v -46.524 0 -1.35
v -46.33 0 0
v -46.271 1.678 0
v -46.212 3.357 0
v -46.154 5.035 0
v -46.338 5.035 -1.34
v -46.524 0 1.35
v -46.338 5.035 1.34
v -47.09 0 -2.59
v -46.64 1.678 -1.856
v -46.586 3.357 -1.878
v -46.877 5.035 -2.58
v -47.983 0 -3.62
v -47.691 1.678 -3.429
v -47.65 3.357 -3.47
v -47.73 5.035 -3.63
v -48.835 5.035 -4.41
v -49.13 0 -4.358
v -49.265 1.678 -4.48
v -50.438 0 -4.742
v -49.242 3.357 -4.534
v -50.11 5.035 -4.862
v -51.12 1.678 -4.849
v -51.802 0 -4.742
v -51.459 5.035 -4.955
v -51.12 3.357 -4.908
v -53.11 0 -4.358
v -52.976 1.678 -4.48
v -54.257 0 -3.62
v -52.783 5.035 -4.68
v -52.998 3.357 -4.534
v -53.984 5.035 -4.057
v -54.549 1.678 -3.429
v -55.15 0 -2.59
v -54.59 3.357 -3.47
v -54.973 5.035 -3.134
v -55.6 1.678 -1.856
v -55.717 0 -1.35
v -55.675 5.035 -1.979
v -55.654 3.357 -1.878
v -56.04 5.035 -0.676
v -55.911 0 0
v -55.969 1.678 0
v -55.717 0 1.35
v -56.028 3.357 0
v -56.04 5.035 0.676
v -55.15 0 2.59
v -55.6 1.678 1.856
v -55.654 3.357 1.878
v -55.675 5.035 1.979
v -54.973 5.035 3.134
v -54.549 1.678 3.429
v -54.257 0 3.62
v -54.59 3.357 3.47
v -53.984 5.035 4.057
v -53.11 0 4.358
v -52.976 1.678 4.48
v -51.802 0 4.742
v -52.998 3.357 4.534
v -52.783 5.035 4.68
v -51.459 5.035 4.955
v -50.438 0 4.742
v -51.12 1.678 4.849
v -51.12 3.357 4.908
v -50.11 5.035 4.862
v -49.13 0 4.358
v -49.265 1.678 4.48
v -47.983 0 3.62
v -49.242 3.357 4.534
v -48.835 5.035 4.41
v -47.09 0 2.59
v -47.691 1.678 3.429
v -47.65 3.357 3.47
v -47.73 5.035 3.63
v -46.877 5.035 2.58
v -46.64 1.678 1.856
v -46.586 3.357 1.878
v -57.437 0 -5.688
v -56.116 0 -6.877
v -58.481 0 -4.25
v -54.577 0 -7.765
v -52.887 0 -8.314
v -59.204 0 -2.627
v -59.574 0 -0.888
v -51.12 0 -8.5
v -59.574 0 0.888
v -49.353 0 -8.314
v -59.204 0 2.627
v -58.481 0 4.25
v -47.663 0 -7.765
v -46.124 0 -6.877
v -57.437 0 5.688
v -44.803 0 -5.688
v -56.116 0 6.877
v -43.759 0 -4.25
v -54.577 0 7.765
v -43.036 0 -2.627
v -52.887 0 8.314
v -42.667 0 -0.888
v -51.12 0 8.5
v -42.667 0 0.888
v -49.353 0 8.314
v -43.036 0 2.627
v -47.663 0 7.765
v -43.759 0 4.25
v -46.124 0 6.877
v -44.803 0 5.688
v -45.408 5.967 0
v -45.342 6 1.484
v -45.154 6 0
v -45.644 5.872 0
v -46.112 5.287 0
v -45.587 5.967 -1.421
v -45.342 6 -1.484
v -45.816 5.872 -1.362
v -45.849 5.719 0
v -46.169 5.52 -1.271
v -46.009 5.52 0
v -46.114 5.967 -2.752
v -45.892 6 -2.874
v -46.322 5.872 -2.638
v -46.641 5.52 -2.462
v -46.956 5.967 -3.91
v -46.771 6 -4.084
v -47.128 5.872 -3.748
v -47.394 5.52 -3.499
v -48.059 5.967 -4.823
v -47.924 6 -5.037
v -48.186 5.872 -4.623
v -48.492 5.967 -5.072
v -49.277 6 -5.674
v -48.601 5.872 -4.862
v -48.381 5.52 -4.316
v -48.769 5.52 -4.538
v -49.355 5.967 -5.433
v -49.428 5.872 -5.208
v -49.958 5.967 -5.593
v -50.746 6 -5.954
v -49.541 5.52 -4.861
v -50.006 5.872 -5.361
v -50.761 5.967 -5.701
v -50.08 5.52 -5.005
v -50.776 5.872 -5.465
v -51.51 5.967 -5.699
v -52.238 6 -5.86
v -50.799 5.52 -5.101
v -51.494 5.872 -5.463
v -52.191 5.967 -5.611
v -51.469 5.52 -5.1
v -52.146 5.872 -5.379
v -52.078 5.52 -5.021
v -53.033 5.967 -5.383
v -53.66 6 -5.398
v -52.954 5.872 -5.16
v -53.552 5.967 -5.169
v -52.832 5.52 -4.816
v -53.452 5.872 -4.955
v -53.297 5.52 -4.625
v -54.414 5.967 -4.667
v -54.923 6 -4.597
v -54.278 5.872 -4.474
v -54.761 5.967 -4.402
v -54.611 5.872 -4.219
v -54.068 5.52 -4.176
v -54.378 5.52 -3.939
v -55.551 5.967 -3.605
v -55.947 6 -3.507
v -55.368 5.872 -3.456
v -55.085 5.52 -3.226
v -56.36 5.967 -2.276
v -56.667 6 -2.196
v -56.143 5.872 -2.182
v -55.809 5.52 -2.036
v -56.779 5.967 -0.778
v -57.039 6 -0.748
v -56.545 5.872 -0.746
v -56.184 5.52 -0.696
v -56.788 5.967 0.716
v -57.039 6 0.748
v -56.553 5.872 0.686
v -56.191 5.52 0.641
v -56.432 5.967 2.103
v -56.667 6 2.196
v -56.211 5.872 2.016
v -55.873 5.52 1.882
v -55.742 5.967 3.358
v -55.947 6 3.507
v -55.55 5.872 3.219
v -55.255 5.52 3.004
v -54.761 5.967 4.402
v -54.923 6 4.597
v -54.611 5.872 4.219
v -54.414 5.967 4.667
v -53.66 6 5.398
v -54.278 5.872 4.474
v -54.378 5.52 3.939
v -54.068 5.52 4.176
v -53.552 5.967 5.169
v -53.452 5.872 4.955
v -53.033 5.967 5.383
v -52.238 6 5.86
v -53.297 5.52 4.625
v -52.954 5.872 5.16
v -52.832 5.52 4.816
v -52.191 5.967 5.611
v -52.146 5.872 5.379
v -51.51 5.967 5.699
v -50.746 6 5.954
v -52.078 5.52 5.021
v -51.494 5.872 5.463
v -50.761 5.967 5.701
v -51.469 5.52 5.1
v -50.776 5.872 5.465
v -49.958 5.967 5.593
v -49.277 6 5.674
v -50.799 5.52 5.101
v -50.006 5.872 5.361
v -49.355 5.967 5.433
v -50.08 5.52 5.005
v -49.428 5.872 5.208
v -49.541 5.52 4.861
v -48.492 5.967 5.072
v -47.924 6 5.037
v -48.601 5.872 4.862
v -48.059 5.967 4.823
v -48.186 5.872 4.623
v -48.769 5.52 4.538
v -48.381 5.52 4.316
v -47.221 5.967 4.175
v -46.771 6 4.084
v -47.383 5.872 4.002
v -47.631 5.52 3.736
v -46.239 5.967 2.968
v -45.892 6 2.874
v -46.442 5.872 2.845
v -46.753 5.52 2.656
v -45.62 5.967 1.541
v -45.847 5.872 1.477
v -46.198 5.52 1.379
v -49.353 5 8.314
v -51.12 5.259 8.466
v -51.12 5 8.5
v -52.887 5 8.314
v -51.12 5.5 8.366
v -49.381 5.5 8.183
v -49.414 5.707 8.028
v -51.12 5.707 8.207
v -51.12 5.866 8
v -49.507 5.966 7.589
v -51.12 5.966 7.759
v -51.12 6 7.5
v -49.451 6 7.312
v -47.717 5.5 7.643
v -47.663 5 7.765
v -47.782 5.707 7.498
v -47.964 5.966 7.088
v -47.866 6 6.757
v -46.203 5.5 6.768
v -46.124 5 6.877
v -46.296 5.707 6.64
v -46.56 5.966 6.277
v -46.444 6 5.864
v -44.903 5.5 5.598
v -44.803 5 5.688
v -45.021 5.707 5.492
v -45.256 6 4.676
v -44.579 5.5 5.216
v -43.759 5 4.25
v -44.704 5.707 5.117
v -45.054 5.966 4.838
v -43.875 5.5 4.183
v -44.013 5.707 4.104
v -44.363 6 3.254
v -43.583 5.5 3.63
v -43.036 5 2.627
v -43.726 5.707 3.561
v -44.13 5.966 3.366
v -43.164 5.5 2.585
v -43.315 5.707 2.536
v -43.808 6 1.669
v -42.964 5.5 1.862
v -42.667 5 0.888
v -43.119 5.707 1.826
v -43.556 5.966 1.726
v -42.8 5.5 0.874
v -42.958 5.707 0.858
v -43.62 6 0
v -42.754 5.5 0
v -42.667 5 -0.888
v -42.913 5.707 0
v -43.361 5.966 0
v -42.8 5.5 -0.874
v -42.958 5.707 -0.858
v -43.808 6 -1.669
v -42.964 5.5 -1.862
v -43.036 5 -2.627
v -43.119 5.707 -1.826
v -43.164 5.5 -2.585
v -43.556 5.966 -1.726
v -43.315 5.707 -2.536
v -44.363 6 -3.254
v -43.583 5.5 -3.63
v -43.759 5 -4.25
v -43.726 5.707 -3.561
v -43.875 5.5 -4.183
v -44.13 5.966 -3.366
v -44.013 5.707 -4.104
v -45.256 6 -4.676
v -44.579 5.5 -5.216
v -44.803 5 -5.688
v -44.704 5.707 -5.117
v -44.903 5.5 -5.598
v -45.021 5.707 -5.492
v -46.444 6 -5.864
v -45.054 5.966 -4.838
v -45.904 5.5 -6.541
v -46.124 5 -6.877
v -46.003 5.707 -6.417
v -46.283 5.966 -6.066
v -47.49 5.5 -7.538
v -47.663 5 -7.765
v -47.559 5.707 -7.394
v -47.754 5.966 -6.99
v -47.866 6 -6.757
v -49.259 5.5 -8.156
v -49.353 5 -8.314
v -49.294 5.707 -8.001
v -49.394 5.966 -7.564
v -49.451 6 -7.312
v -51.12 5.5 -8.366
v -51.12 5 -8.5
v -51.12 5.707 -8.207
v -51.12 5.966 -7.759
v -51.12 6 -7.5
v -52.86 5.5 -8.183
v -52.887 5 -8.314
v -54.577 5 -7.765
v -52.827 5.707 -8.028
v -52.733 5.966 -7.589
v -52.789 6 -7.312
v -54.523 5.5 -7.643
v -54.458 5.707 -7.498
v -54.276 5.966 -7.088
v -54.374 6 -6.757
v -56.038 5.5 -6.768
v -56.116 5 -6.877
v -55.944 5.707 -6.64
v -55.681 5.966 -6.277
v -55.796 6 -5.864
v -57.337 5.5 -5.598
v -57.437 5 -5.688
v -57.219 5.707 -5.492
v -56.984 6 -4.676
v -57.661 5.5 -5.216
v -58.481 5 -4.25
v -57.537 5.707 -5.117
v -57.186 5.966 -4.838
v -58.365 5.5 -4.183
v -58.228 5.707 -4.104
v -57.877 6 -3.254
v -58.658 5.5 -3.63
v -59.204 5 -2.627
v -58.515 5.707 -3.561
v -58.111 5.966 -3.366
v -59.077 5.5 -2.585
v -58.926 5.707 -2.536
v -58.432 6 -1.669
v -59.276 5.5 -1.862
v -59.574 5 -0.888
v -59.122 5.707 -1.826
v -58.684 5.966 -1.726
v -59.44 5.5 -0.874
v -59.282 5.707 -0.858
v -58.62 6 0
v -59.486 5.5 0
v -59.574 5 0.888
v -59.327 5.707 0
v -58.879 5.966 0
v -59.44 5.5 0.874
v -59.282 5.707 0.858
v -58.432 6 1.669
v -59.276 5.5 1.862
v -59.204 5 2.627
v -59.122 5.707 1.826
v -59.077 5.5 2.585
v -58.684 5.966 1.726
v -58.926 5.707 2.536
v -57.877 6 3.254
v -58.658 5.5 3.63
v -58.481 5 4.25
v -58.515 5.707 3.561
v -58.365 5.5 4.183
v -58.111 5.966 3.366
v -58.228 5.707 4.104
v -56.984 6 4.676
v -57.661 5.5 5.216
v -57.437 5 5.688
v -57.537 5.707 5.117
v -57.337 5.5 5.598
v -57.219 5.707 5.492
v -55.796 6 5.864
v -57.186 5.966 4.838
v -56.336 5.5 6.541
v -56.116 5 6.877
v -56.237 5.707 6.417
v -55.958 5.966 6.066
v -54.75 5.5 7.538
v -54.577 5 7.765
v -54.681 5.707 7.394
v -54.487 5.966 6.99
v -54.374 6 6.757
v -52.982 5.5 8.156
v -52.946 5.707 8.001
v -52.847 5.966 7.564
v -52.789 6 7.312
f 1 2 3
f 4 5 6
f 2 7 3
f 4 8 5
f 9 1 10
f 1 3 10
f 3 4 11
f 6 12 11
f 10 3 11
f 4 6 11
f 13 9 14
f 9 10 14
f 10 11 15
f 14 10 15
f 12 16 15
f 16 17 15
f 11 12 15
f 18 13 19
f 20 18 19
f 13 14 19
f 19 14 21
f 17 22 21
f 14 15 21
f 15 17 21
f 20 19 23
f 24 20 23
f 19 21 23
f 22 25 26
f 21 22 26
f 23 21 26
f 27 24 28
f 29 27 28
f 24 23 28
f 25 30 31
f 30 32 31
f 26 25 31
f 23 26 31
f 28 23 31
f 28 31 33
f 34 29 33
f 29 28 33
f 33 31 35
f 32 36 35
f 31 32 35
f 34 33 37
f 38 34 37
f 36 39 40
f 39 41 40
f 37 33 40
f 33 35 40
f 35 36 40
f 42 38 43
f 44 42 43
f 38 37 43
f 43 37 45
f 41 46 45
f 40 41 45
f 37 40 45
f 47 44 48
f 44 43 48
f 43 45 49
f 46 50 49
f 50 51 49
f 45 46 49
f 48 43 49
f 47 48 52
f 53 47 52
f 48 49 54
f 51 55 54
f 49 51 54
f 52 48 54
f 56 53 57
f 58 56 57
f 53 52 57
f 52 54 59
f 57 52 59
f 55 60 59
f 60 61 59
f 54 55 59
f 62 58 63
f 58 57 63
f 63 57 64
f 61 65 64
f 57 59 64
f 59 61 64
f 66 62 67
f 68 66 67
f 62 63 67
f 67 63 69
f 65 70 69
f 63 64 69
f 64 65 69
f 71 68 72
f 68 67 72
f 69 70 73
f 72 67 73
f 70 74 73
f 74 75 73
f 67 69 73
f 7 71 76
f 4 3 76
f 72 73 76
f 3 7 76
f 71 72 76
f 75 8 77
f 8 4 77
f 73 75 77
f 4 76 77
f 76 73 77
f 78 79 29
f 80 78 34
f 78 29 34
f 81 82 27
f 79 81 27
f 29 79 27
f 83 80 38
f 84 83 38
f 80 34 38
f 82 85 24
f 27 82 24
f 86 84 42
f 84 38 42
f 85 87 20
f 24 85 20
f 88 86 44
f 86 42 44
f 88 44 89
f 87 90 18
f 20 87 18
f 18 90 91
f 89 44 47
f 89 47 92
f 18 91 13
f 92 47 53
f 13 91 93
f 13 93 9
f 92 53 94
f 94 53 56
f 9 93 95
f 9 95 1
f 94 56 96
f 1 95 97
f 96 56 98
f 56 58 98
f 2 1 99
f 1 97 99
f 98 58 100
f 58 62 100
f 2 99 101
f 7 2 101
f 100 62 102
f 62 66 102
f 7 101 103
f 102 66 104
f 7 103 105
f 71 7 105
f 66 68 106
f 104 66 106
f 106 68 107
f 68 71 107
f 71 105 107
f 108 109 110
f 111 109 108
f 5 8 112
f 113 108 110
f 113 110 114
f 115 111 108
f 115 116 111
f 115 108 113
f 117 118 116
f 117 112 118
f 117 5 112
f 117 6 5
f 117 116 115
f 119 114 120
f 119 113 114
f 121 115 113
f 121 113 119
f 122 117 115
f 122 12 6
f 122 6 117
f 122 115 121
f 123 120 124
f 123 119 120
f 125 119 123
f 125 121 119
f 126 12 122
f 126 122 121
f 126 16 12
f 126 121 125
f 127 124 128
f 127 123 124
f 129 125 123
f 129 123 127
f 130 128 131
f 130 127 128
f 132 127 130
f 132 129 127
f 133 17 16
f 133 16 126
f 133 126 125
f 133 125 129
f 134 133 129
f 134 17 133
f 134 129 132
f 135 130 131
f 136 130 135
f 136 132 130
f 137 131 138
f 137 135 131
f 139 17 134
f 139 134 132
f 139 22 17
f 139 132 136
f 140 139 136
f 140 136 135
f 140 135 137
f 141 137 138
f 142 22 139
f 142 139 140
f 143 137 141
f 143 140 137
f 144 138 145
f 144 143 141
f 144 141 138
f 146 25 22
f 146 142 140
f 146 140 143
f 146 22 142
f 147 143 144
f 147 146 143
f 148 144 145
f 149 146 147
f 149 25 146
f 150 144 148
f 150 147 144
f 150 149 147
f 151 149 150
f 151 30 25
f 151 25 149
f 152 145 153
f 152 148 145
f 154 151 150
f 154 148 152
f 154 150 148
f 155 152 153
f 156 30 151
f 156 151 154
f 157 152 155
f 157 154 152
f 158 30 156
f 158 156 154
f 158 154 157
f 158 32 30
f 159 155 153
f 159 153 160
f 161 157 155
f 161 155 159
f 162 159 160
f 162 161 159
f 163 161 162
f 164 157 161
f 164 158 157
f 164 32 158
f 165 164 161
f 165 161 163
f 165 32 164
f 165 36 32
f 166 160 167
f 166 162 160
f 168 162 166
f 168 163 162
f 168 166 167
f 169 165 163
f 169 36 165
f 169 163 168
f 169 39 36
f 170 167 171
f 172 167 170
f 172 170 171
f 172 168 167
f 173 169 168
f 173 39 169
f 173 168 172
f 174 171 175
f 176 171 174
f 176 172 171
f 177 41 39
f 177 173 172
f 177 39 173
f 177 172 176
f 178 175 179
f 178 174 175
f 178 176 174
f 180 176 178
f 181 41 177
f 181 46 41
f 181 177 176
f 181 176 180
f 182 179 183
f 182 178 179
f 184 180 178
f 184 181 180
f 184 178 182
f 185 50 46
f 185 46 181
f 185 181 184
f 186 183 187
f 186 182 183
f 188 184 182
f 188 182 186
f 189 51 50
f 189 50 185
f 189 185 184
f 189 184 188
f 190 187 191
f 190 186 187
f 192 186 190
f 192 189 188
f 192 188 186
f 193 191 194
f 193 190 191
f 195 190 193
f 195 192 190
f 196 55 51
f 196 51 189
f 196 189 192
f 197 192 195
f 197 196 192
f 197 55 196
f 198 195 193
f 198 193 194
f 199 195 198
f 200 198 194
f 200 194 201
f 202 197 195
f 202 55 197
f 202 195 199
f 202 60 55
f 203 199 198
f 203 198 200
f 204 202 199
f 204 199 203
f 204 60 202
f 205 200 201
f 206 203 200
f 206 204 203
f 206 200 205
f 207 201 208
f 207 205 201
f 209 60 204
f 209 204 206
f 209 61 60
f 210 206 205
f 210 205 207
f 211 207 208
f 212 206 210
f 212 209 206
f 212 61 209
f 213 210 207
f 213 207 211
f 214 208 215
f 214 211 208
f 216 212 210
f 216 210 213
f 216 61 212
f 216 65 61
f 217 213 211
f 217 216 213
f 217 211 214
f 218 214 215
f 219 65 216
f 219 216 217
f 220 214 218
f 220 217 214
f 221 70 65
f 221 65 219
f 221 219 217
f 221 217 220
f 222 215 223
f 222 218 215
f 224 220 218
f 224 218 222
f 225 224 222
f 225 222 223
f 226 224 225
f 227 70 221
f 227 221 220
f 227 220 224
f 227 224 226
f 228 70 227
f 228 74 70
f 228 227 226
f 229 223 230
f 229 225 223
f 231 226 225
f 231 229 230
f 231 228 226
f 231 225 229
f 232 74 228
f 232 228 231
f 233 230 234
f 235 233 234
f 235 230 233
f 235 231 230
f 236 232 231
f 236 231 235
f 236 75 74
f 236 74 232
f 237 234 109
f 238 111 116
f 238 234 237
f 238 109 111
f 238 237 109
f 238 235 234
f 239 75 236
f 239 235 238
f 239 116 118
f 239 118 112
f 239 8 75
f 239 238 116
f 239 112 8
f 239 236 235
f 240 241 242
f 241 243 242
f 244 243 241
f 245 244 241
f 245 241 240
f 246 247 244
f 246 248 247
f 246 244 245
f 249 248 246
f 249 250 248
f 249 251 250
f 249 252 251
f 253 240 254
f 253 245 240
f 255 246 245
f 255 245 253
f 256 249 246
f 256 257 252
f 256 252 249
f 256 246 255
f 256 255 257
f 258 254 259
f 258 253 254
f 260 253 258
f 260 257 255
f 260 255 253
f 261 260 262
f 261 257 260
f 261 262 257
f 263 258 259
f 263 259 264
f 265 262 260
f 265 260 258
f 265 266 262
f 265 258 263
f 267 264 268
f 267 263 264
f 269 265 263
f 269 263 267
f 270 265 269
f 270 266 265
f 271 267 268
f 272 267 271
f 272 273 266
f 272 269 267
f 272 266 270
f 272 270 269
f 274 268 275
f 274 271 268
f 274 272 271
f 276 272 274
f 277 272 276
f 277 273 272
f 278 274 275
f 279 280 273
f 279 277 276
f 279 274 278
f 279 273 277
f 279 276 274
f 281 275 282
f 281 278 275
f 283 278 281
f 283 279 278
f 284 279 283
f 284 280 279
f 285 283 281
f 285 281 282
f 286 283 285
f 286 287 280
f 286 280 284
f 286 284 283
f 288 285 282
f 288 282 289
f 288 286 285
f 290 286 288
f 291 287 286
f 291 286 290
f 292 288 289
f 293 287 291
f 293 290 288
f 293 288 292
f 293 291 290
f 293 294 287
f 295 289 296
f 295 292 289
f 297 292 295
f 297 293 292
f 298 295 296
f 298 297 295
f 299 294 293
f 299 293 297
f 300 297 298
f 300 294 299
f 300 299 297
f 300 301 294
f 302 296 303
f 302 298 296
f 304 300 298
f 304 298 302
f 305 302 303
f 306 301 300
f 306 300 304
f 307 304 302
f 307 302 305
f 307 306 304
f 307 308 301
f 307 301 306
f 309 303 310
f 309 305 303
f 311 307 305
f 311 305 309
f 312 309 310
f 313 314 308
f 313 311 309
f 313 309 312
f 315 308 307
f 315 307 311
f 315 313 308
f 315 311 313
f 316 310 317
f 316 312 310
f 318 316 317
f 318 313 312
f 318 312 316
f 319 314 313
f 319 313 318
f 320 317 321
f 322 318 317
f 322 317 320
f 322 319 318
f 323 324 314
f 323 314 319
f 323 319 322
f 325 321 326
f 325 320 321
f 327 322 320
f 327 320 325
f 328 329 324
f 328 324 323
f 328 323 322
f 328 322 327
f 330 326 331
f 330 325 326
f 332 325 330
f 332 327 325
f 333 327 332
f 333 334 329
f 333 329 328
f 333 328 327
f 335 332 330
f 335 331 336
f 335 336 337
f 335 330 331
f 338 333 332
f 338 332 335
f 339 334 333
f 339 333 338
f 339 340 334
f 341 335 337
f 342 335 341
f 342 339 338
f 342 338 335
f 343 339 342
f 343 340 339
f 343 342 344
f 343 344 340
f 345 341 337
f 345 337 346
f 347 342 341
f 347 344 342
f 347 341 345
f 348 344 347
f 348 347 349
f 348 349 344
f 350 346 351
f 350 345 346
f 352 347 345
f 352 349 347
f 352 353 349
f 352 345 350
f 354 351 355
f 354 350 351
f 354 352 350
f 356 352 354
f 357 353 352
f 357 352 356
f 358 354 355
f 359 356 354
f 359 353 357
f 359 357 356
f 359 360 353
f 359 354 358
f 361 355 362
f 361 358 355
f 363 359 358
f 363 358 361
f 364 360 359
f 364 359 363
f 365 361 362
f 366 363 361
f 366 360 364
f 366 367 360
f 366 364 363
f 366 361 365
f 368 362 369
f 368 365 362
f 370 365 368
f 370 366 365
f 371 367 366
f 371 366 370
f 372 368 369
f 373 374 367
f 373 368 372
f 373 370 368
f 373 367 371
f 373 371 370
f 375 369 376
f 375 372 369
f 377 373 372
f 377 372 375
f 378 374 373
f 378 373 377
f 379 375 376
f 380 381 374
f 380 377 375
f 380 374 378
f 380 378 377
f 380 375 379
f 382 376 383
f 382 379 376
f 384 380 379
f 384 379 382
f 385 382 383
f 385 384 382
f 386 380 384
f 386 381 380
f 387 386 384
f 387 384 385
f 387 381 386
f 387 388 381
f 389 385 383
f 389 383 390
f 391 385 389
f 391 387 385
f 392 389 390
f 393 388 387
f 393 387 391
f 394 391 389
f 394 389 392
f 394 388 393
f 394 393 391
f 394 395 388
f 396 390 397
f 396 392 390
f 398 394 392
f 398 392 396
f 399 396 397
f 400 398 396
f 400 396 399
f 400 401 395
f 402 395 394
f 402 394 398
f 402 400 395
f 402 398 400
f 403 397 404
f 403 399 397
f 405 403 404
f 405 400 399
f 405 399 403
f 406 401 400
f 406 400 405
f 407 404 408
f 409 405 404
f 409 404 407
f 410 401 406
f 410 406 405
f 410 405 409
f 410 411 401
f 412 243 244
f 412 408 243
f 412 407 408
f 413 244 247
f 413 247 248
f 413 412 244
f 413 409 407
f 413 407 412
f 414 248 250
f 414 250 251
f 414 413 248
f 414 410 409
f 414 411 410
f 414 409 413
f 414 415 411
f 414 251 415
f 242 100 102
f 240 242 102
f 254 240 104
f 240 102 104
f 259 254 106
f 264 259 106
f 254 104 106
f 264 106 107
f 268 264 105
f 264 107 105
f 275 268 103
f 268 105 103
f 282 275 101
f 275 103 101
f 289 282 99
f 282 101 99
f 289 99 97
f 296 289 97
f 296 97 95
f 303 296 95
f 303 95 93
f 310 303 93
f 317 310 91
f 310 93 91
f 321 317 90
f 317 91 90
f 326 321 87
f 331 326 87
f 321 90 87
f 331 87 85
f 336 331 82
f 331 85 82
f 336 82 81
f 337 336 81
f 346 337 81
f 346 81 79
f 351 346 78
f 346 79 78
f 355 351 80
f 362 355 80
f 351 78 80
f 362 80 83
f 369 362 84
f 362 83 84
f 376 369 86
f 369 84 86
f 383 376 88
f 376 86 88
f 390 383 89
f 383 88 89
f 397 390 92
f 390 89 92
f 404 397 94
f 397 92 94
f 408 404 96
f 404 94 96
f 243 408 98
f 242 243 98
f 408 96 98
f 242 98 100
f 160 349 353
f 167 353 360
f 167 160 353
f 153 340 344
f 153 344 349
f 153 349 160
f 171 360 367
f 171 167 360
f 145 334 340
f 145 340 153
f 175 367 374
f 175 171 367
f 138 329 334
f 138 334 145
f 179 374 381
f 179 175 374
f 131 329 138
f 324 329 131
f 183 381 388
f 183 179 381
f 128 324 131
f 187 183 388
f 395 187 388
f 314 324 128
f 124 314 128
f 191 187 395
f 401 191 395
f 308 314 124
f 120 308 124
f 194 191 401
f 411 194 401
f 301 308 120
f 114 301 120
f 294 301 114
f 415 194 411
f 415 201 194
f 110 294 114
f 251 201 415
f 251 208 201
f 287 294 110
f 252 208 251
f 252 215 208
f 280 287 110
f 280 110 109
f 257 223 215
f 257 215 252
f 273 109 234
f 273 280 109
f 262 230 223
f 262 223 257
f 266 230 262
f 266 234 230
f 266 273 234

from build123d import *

# Parameters (mm, degrees)
SKETCH1_R           = 8.5
BOSS_EXTRUDE1_DEPTH = 6
FILLET2_R           = 1
SKETCH2_R           = 5
CUT_EXTRUDE4_DEPTH  = 6
CUT_EXTRUDE4_DRAFT  = -2
FILLET5_R           = 1


with BuildPart() as part:
    # Sketch1 → Boss-Extrude1 (new body)
    with BuildSketch(Plane(origin=(0, 0, 0), x_dir=(1, 0, 0), z_dir=(0, 1, 0))):
        with Locations(Location((-51.120170416, 0, 0), (0, 0, 270))):
            Circle(SKETCH1_R)
    extrude(amount=BOSS_EXTRUDE1_DEPTH)

    # Fillet2
    fillet2_edges = [part.edges().sort_by_distance(p)[0] for p in [
        (-51.120170416, 6, -8.5),
    ]]
    fillet(fillet2_edges, radius=FILLET2_R)


with BuildPart() as cut_extrude4_tool:
    # Sketch2 → Cut-Extrude4 (with draft: the straight prism first)
    with BuildSketch(Plane(origin=(0, 6, 0), x_dir=(1, 0, 0), z_dir=(0, 1, 0))):
        with Locations((-51.120170416, 0)):
            Circle(SKETCH2_R)
    extrude(amount=-CUT_EXTRUDE4_DEPTH)
    # Cut-Extrude4: the draft: its side faces are tilted about the plane it starts from
    cut_extrude4_sides = [cut_extrude4_tool.faces().sort_by_distance(p)[0] for p in [
        (-56.120170416, 3, 0),
    ]]
    draft(cut_extrude4_sides, Plane(origin=(0, 6, 0), x_dir=(1, 0, 0), z_dir=(0, 1, 0)), CUT_EXTRUDE4_DRAFT)


with BuildPart() as part_1:
    add(part.part)

    # Cut-Extrude4: cut by cut_extrude4_tool
    add(cut_extrude4_tool.part, mode=Mode.SUBTRACT)

    # Fillet5
    fillet5_edges = [part_1.edges().sort_by_distance(p)[0] for p in [
        (-56.120170416, 6, 0),
    ]]
    fillet(fillet5_edges, radius=FILLET5_R)


solid = part_1.part
